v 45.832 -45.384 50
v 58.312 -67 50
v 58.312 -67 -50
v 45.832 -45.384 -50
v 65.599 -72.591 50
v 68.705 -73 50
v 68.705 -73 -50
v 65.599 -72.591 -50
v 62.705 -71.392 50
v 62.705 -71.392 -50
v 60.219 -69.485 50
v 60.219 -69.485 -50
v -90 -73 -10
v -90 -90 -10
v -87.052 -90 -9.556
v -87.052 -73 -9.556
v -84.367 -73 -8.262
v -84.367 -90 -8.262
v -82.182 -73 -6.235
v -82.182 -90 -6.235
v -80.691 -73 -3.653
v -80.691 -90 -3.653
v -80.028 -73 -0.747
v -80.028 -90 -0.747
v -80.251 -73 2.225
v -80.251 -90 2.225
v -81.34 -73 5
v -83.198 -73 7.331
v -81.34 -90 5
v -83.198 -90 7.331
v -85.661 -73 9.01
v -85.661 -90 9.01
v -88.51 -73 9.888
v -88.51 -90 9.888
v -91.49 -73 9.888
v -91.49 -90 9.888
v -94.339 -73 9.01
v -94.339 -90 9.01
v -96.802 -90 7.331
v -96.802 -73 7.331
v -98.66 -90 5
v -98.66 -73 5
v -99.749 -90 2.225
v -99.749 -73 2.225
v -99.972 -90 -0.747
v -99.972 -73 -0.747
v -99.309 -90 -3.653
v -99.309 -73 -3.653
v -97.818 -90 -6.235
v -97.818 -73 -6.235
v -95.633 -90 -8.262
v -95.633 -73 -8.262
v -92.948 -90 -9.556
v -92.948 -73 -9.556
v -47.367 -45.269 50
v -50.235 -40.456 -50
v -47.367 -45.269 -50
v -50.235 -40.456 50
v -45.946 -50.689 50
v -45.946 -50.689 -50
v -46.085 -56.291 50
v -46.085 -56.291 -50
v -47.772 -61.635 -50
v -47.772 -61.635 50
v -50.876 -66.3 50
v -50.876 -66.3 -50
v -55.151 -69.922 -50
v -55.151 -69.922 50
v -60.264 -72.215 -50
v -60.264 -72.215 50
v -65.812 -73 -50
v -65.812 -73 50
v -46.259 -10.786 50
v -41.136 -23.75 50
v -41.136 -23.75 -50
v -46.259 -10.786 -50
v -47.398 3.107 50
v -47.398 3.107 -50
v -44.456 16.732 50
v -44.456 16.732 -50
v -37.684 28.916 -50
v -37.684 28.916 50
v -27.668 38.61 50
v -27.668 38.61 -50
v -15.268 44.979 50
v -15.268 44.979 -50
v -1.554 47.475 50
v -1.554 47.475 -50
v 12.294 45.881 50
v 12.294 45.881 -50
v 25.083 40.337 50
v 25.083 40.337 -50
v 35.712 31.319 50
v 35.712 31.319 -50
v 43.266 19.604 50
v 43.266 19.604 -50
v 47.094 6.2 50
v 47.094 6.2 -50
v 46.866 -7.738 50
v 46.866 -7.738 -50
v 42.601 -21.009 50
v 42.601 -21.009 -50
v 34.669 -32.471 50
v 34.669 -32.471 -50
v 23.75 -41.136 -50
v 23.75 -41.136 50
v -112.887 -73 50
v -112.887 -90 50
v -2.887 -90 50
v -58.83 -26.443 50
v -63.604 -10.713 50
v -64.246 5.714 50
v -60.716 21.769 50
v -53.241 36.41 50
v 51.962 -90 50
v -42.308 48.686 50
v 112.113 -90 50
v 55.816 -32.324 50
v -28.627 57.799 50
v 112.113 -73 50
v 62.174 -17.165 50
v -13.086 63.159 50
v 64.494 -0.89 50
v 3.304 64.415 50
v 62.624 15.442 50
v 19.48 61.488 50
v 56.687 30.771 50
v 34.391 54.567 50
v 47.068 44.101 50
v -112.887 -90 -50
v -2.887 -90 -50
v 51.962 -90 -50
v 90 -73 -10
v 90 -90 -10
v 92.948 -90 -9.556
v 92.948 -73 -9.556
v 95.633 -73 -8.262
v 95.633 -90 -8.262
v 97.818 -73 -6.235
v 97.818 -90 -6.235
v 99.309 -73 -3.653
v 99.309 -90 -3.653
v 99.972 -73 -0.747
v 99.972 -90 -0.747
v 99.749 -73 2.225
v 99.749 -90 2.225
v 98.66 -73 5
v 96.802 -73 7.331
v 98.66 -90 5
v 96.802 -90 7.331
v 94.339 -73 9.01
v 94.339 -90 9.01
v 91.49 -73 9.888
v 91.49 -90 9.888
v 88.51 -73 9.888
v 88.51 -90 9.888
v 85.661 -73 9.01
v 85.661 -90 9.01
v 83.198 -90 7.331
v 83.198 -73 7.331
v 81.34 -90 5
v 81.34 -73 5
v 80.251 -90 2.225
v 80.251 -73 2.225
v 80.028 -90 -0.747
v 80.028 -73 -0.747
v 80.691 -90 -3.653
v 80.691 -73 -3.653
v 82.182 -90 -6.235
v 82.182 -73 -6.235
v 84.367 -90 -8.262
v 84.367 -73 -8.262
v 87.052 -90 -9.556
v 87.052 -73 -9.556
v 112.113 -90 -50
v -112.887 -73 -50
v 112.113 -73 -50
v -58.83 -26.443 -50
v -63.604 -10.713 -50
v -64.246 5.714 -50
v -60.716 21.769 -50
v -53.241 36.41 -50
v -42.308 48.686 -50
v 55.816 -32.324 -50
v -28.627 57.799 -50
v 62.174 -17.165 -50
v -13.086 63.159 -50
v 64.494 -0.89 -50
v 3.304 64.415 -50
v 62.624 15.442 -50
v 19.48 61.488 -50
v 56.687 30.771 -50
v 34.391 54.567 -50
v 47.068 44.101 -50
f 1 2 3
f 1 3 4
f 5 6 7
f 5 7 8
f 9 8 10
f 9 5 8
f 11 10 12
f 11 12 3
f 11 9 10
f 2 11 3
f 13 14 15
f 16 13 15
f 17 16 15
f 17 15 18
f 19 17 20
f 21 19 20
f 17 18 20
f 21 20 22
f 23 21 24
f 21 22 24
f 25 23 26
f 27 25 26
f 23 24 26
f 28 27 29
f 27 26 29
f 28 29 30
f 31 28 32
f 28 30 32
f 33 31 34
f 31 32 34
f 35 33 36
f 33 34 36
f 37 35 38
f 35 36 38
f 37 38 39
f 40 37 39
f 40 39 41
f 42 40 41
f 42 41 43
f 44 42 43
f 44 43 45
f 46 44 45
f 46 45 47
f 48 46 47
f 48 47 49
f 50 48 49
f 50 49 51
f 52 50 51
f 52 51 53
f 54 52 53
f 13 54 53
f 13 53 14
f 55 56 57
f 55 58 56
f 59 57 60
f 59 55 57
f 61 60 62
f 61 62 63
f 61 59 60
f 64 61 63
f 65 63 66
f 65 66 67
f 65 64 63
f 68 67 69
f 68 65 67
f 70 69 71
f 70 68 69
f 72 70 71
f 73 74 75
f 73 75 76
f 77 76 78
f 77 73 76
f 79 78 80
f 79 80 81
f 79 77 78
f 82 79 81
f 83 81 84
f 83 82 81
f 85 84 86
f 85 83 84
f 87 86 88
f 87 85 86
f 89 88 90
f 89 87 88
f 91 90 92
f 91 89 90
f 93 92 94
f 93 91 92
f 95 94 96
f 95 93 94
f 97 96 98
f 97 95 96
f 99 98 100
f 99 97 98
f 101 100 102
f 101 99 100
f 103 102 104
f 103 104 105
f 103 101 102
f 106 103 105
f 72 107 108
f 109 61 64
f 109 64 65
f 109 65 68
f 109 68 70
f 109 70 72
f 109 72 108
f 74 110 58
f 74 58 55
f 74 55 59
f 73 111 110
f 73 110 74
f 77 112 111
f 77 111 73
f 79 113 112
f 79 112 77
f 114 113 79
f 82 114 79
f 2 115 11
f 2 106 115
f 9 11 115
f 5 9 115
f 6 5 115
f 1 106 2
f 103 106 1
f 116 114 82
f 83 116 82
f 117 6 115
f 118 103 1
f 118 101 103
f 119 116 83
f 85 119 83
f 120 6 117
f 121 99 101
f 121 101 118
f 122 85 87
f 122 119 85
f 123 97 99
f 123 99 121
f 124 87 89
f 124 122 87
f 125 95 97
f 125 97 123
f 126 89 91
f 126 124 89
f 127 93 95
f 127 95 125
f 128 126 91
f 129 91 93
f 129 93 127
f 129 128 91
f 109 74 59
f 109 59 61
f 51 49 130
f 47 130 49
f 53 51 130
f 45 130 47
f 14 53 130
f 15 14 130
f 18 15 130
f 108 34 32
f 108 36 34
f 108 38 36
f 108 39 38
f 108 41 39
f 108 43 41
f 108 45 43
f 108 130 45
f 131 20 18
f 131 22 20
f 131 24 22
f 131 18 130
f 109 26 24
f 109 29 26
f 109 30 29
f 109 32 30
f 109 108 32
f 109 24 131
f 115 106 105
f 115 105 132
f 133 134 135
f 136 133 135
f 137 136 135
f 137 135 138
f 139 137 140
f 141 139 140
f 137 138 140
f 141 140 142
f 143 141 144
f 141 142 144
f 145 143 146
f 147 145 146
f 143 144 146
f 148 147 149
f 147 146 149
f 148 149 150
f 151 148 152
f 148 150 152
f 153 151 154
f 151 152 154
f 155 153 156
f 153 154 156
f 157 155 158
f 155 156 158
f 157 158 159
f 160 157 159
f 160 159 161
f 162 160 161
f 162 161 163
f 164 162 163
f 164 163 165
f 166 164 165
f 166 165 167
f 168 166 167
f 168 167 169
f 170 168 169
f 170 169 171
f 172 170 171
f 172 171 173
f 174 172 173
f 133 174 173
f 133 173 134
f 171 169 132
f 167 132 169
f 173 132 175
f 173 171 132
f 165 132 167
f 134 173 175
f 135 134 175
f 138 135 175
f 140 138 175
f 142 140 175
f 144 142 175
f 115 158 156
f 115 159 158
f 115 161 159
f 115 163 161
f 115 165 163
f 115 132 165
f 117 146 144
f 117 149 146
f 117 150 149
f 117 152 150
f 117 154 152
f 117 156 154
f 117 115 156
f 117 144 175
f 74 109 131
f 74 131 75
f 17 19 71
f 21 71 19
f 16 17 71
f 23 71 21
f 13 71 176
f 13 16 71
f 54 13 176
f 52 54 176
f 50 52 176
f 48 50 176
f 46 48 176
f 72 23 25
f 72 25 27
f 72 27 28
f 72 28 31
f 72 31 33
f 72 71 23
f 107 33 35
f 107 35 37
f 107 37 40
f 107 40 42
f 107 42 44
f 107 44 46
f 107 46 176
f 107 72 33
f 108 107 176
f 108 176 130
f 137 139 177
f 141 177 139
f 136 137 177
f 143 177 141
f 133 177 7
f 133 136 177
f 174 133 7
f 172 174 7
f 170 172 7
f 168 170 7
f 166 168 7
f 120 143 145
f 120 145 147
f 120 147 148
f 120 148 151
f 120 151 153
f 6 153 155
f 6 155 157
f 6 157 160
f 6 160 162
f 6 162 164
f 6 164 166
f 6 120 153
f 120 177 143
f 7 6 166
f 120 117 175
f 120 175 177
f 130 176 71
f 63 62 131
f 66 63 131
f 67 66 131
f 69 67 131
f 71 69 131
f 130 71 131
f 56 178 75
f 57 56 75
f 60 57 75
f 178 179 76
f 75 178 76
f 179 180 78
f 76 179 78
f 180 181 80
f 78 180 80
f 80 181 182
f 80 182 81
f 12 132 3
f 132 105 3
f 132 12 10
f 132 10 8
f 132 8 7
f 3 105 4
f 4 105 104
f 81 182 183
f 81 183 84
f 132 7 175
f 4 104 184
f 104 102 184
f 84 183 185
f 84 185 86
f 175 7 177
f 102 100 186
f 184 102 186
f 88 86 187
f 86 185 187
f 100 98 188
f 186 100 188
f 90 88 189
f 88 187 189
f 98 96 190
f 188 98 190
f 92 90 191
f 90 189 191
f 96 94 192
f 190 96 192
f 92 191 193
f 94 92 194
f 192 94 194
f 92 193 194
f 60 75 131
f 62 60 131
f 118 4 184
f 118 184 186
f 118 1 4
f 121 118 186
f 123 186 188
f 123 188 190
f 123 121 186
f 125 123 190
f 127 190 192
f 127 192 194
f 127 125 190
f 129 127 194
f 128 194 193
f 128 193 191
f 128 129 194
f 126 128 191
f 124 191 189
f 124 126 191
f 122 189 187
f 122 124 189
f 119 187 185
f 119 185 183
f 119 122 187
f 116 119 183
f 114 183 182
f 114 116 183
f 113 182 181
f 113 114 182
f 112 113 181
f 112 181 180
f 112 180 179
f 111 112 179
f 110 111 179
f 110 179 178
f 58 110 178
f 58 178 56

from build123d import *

# Parameters (mm, degrees)
BOSS_EXTRUDE1_DEPTH = 50
CUT_EXTRUDE1_REACH  = 199.772
SKETCH2_R           = 10


with BuildPart() as part:
    # Sketch1 → Boss-Extrude1 (new, symmetric)
    with BuildSketch(Plane.XY):
        with BuildLine():
            Line((-65.812232905, -73), (-112.886751346, -73))
            Line((-112.886751346, -73), (-112.886751346, -90))
            Line((-112.886751346, -90), (-2.886751346, -90))
            Line((-2.886751346, -90), (-41.13620668, -23.75))
            ThreePointArc((-41.13620668, -23.75), (12.293904642, 45.881476749), (23.75, -41.13620668))
            Line((23.75, -41.13620668), (51.961524227, -90))
            Line((51.961524227, -90), (112.113248654, -90))
            Line((112.113248654, -90), (112.113248654, -73))
            Line((112.113248654, -73), (68.704682034, -73))
            ThreePointArc((68.704682034, -73), (62.704682034, -71.392304845), (58.312377188, -67))
            Line((58.312377188, -67), (45.832116851, -45.383555005))
            ThreePointArc((45.832116851, -45.383555005), (3.304284934, 64.415306419), (-50.235373046, -40.455621302))
            ThreePointArc((-50.235373046, -40.455621302), (-47.772172291, -61.634593969), (-65.812232905, -73))
        make_face()
    extrude(amount=BOSS_EXTRUDE1_DEPTH, both=True)

    # Sketch2 → Cut-Extrude1 (cut, up to next)
    with BuildSketch(Plane.XZ.offset(90), mode=Mode.PRIVATE) as cut_extrude1_sk1:
        with Locations(Location((90, 0, 0), (0, 0, 270))):
            Circle(SKETCH2_R)
    cut_extrude1_tool1 = extrude(cut_extrude1_sk1.sketch, amount=-CUT_EXTRUDE1_REACH, mode=Mode.PRIVATE) & part.part
    # Sketch2 → Cut-Extrude1 (cut, up to next)
    with BuildSketch(Plane.XZ.offset(90), mode=Mode.PRIVATE) as cut_extrude1_sk2:
        with Locations(Location((-90, 0, 0), (0, 0, 270))):
            Circle(SKETCH2_R)
    cut_extrude1_tool2 = extrude(cut_extrude1_sk2.sketch, amount=-CUT_EXTRUDE1_REACH, mode=Mode.PRIVATE) & part.part
    add(cut_extrude1_tool1.solids().sort_by_distance((90, -90, 0))[0], mode=Mode.SUBTRACT)
    add(cut_extrude1_tool2.solids().sort_by_distance((-90, -90, 0))[0], mode=Mode.SUBTRACT)


solid = part.part
